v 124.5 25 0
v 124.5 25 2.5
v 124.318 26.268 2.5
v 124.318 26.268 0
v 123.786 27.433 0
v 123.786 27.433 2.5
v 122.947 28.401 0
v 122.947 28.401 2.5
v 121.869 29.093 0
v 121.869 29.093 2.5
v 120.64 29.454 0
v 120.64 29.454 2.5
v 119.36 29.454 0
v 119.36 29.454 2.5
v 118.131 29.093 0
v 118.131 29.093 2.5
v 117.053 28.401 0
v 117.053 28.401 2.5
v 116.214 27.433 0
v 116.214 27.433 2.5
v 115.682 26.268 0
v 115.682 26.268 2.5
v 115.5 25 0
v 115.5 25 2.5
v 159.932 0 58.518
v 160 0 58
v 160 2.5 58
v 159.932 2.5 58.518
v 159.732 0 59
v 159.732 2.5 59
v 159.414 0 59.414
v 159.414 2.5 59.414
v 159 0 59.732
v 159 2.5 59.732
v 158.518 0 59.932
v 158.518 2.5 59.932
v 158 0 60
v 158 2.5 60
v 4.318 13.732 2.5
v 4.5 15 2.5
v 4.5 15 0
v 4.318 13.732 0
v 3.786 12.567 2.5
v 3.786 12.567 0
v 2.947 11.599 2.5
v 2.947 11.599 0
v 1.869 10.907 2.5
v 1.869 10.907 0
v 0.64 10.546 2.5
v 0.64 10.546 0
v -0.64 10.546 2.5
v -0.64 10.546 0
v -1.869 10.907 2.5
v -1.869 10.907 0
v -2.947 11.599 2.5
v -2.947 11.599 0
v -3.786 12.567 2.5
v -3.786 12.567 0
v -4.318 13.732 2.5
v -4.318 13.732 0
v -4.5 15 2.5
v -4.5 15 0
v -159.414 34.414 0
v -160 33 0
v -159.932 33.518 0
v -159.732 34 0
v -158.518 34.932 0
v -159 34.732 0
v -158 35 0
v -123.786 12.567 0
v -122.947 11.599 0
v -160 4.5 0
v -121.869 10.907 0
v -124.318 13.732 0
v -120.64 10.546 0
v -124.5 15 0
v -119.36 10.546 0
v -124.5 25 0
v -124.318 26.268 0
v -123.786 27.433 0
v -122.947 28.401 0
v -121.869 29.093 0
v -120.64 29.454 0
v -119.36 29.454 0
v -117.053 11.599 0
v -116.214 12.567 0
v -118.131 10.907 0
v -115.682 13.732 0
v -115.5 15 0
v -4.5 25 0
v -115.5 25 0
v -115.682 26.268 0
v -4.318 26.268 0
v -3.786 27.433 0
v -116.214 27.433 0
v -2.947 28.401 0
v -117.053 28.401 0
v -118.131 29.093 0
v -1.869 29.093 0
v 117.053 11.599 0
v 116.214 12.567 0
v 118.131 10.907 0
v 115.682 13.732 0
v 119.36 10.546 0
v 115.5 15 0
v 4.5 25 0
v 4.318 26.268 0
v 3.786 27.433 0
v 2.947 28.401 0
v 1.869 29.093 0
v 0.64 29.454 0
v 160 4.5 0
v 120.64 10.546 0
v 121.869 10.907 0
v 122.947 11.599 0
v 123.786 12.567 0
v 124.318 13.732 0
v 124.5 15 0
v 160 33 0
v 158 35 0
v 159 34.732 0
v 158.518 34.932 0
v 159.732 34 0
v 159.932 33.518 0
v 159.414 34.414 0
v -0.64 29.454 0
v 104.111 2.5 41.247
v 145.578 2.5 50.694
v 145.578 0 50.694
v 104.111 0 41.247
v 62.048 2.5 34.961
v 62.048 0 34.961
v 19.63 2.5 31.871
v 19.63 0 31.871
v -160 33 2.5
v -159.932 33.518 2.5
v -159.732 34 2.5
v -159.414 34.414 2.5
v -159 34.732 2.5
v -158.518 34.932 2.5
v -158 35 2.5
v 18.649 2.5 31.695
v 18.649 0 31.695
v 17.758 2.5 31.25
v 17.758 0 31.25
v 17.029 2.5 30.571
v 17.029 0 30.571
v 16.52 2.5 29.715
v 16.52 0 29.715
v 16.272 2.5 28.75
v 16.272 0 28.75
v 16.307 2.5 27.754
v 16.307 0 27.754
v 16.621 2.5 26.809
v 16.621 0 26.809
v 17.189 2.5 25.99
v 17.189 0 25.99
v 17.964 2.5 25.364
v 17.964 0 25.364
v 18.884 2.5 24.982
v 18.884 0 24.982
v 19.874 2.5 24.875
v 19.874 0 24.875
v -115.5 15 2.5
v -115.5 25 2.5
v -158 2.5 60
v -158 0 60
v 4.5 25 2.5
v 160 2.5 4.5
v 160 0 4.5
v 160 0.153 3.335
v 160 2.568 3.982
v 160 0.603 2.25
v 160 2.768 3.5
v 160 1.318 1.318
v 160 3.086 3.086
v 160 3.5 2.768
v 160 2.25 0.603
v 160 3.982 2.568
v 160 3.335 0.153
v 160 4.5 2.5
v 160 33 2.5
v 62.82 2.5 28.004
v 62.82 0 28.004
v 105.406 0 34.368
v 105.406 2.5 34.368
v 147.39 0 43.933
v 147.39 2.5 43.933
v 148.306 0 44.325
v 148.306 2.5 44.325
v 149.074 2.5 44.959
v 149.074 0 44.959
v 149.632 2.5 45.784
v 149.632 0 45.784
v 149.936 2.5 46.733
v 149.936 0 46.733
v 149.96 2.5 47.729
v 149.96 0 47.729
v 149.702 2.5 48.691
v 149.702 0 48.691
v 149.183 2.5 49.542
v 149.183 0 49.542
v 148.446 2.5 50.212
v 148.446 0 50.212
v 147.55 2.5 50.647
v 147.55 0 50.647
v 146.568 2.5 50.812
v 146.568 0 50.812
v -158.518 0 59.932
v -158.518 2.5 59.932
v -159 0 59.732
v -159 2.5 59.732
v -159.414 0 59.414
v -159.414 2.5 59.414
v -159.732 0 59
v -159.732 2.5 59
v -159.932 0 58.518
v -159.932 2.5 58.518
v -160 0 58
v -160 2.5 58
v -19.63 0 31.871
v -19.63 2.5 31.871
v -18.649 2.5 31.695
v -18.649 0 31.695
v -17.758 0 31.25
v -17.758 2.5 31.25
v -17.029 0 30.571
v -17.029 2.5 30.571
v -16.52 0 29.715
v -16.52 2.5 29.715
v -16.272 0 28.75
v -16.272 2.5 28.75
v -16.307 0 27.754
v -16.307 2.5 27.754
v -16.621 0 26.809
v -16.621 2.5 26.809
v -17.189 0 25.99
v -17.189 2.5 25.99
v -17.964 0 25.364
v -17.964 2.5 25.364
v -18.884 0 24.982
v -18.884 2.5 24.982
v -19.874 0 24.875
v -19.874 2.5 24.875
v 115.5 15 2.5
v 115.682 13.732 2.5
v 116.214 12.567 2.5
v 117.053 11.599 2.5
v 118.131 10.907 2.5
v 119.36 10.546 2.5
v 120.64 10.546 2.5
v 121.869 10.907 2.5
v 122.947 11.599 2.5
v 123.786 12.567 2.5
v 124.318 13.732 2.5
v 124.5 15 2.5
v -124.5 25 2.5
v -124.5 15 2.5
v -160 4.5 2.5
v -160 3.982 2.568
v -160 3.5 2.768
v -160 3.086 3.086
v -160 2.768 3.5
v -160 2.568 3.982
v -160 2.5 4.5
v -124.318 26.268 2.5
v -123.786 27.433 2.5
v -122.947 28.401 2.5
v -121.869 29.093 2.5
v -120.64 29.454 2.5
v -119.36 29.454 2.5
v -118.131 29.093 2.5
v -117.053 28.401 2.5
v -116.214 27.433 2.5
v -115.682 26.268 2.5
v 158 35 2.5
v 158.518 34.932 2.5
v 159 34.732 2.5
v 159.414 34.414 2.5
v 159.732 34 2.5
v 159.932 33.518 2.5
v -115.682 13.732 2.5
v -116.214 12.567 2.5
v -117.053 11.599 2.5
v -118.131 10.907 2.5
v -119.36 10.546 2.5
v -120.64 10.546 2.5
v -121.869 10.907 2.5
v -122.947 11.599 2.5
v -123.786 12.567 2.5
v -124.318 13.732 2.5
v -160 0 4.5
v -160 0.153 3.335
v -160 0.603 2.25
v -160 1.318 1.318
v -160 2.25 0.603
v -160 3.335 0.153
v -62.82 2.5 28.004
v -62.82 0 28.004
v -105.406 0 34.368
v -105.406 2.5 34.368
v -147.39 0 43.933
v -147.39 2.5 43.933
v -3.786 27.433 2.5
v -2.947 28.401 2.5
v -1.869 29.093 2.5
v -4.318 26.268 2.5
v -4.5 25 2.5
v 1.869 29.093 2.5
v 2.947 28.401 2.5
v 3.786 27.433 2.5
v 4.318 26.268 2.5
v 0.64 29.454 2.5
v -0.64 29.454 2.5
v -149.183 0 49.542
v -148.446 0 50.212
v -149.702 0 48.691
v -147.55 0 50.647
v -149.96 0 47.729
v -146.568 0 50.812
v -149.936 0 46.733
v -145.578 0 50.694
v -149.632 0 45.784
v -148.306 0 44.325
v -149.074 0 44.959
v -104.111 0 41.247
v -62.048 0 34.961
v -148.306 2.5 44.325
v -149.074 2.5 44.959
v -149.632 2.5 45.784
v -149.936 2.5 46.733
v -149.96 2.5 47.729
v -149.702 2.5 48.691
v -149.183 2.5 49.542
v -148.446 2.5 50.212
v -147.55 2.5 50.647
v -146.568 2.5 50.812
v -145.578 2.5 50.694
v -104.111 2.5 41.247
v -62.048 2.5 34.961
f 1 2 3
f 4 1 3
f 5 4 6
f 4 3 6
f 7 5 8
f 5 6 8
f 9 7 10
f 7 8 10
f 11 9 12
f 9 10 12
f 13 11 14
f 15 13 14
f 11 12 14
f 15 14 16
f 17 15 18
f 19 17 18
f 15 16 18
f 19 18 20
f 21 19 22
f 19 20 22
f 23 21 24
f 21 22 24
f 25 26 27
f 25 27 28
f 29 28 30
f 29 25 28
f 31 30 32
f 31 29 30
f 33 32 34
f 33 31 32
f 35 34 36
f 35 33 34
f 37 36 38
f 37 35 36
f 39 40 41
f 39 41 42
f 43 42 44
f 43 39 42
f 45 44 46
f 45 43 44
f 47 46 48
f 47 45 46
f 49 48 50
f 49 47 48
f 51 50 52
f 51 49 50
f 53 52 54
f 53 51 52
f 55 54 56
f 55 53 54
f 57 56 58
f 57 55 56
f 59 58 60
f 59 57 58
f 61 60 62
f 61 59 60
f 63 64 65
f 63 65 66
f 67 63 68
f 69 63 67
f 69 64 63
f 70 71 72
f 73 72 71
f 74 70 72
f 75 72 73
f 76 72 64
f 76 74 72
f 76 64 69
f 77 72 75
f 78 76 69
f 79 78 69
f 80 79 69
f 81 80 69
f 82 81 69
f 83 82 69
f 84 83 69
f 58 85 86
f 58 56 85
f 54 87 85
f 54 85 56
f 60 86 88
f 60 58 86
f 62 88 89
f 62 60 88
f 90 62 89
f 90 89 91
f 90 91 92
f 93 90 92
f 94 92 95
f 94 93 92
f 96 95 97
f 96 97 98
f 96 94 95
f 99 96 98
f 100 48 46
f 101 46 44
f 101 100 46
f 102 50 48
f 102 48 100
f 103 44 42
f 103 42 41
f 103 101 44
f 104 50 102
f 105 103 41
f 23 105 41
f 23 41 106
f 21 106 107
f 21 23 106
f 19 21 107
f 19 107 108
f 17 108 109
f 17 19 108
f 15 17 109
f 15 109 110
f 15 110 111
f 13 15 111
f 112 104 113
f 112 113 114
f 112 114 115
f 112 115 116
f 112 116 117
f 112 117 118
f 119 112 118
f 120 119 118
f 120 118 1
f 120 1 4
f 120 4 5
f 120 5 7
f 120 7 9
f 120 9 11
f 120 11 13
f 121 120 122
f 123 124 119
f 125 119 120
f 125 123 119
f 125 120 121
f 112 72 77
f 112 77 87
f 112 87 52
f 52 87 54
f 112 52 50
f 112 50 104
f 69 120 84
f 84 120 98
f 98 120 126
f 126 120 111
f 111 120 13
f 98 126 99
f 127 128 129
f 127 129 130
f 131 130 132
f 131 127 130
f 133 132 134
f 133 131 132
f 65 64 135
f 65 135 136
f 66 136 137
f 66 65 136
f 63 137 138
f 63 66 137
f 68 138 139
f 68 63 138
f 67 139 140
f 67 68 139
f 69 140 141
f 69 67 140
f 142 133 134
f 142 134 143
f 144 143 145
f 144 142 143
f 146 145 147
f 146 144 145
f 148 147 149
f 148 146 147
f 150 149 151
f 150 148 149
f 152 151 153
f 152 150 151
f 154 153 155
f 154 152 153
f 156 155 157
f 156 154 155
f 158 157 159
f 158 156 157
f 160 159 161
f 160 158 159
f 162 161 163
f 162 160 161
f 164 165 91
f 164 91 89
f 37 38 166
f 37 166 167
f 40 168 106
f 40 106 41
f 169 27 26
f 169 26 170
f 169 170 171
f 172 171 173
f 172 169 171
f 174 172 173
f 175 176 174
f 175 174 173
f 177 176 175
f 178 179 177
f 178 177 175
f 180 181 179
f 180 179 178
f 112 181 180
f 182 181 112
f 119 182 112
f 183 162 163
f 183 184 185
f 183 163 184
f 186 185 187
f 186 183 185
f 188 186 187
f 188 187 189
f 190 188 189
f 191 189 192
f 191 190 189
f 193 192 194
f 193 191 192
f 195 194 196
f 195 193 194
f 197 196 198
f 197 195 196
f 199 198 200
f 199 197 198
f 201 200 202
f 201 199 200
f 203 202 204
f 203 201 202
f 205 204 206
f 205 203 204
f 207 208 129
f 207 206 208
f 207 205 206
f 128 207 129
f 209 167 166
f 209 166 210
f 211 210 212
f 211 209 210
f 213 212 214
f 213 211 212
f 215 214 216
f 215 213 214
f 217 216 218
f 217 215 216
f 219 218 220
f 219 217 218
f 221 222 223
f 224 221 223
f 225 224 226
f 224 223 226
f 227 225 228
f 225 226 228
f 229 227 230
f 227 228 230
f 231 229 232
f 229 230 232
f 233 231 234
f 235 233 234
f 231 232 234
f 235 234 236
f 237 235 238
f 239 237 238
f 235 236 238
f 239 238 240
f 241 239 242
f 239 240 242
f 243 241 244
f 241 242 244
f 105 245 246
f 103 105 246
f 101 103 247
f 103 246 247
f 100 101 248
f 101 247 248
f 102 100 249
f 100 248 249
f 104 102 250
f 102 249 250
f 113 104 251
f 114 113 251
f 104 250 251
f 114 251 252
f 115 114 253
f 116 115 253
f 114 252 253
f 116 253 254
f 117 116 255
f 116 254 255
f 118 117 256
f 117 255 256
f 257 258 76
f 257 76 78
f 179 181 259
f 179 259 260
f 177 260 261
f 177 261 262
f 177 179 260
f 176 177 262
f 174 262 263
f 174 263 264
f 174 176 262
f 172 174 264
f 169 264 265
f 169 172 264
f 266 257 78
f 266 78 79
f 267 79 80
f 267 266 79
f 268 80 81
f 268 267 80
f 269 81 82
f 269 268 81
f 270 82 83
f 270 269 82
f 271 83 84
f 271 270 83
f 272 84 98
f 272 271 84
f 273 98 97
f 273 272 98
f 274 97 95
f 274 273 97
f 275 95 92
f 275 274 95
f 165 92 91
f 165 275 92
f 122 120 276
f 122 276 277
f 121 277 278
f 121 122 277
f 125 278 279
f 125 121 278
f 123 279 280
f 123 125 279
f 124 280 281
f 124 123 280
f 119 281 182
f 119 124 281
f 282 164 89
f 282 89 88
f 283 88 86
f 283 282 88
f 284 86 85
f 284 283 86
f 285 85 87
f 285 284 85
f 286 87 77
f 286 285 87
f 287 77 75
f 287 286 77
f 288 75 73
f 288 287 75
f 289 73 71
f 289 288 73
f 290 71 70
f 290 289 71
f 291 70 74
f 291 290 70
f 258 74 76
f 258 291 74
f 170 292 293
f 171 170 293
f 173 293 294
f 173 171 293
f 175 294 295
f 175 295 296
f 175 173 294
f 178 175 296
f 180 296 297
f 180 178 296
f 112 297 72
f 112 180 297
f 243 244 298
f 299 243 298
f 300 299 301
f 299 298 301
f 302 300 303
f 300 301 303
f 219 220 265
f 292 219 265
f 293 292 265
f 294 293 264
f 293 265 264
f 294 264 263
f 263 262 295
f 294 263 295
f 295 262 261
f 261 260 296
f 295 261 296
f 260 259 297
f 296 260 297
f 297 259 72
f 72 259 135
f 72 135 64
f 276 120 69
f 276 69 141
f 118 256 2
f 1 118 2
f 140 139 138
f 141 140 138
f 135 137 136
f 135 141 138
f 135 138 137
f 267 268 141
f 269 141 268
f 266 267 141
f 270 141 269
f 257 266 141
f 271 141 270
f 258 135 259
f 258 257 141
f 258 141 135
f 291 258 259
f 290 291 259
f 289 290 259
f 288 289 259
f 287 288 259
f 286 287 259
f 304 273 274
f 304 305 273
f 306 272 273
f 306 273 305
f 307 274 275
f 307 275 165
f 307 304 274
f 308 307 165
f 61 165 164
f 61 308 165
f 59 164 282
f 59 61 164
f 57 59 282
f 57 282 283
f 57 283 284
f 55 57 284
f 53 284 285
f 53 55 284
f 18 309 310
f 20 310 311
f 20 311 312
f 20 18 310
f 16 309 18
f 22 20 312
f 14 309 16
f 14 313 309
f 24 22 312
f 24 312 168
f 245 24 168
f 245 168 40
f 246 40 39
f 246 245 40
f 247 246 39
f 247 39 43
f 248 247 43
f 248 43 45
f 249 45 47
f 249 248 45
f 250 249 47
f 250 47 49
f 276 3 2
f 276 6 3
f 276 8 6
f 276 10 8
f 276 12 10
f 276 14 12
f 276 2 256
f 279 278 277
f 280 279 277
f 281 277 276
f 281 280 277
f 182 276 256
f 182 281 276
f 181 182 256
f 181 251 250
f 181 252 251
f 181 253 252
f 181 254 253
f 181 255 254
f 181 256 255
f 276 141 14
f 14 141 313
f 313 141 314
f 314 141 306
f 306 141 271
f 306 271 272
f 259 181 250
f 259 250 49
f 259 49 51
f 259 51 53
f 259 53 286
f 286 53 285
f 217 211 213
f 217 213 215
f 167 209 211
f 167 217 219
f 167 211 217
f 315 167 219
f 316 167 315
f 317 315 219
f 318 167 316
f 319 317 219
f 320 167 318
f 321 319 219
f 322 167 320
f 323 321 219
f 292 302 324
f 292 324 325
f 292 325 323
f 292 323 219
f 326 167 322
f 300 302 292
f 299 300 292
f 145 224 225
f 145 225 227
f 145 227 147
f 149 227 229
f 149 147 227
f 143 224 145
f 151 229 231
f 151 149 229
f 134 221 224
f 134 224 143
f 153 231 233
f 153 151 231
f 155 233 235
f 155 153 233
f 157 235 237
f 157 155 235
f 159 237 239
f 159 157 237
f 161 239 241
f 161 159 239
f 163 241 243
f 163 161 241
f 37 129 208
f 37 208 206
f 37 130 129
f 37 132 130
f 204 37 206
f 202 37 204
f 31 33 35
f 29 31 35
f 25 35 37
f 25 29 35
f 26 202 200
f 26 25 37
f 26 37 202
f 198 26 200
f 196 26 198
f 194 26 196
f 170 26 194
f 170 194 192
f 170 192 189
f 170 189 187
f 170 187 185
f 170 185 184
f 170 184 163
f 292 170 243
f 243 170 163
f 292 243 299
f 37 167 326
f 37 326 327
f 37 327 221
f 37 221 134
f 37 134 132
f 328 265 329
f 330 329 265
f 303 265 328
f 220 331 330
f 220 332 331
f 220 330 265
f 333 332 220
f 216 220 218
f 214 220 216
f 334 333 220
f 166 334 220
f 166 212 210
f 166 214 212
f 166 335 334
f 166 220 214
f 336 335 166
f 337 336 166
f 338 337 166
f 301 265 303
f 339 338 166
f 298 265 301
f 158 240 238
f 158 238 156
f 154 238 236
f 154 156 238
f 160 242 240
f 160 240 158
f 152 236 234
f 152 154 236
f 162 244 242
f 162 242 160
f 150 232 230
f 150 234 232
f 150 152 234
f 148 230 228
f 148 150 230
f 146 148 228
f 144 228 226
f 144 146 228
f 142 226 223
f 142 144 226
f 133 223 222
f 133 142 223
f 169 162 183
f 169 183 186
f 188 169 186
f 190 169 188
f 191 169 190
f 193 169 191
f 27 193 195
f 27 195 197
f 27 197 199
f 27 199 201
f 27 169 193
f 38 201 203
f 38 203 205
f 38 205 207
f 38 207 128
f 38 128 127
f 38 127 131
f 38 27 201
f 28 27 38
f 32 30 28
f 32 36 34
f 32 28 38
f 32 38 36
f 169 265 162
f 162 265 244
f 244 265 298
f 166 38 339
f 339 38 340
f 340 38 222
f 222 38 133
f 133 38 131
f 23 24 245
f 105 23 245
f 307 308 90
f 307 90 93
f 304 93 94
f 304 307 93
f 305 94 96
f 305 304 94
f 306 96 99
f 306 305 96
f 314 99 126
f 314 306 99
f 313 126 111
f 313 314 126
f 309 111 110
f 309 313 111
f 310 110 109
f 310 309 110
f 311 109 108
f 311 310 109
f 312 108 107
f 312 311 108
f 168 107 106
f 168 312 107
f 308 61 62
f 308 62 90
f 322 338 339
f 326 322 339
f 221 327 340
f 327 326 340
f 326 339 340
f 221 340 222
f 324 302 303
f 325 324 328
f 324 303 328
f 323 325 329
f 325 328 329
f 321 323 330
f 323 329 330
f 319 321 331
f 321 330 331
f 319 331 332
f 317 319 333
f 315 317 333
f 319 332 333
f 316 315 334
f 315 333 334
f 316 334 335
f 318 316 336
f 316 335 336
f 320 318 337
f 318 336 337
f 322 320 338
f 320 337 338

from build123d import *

# Parameters (mm, degrees)
SM_BASE_FLANGE_1_DEPTH = 160
CUT_EXTRUDE_2_DEPTH    = 174.583553368
CUT_EXTRUDE_3_REACH    = 175.943
OTHER_1_DEPTH          = 2.5
OTHER_1_2_DEPTH        = 2.5


# Read off the part's stored shape, not the designer's step: 断开-边角1
# Sheet-metal steps are written as plain solids
with BuildPart() as part:
    # Sketch 1 → 基体-法兰1 (new, symmetric)
    with BuildSketch(Plane(origin=(0, 0, 0), x_dir=(0, 0, -1), z_dir=(1, 0, 0))):
        with BuildLine():
            Line((-60, 0), (-4.5, 0))
            ThreePointArc((-4.5, 0), (-1.318019485, 1.318019485), (0, 4.5))
            Line((0, 4.5), (0, 35))
            Line((0, 35), (-2.5, 35))
            Line((-2.5, 35), (-2.5, 4.5))
            ThreePointArc((-2.5, 4.5), (-3.085786438, 3.085786438), (-4.5, 2.5))
            Line((-4.5, 2.5), (-60, 2.5))
            Line((-60, 2.5), (-60, 0))
        make_face()
    extrude(amount=SM_BASE_FLANGE_1_DEPTH, both=True)

    # 草图5 → 切除-拉伸2 (cut, through all)
    with BuildSketch(Plane.XY.offset(2.5)):
        with BuildLine():
            Line((-115.5, 25), (-115.5, 15))
            ThreePointArc((-115.5, 15), (-120, 10.5), (-124.5, 15))
            Line((-124.5, 15), (-124.5, 25))
            ThreePointArc((-124.5, 25), (-120, 29.5), (-115.5, 25))
        make_face()
        with BuildLine():
            Line((115.5, 25), (115.5, 15))
            ThreePointArc((115.5, 15), (120, 10.5), (124.5, 15))
            Line((124.5, 15), (124.5, 25))
            ThreePointArc((124.5, 25), (120, 29.5), (115.5, 25))
        make_face()
        with BuildLine():
            Line((4.5, 25), (4.5, 15))
            ThreePointArc((4.5, 15), (0, 10.5), (-4.5, 15))
            Line((-4.5, 15), (-4.5, 25))
            ThreePointArc((-4.5, 25), (0, 29.5), (4.5, 25))
        make_face()
    extrude(amount=-CUT_EXTRUDE_2_DEPTH, mode=Mode.SUBTRACT)

    # 草图6 → 切除-拉伸3 (cut, up to next)
    with BuildSketch(Plane(origin=(0, 2.5, 0), x_dir=(1, 0, 0), z_dir=(0, 1, 0)), mode=Mode.PRIVATE) as cut_extrude_3_sk1:
        with BuildLine():
            ThreePointArc((-19.874276789, -24.875176049), (-84.173281176, -30.783424559), (-147.390129564, -43.932547934))
            ThreePointArc((-147.390129564, -43.932547934), (-149.865003298, -48.219154984), (-145.578396248, -50.694028718))
            ThreePointArc((-145.578396248, -50.694028718), (-83.138615298, -37.706535603), (-19.629980312, -31.870911838))
            ThreePointArc((-19.629980312, -31.870911838), (-16.254260656, -28.250895705), (-19.874276789, -24.875176049))
        make_face()
    cut_extrude_3_tool1 = extrude(cut_extrude_3_sk1.sketch, amount=-CUT_EXTRUDE_3_REACH, mode=Mode.PRIVATE) & part.part
    # 草图6 → 切除-拉伸3 (cut, up to next)
    with BuildSketch(Plane(origin=(0, 2.5, 0), x_dir=(1, 0, 0), z_dir=(0, 1, 0)), mode=Mode.PRIVATE) as cut_extrude_3_sk2:
        with BuildLine():
            ThreePointArc((19.874276789, -24.875176049), (84.173281176, -30.783424559), (147.390129564, -43.932547934))
            ThreePointArc((147.390129564, -43.932547934), (149.865003298, -48.219154984), (145.578396248, -50.694028718))
            ThreePointArc((145.578396248, -50.694028718), (83.138615298, -37.706535603), (19.629980312, -31.870911838))
            ThreePointArc((19.629980312, -31.870911838), (16.254260656, -28.250895705), (19.874276789, -24.875176049))
        make_face()
    cut_extrude_3_tool2 = extrude(cut_extrude_3_sk2.sketch, amount=-CUT_EXTRUDE_3_REACH, mode=Mode.PRIVATE) & part.part
    add(cut_extrude_3_tool1.solids().sort_by_distance((-83.461905, 2.5, 35.543351))[0], mode=Mode.SUBTRACT)
    add(cut_extrude_3_tool2.solids().sort_by_distance((83.461905, 2.5, 35.543351))[0], mode=Mode.SUBTRACT)

    # Other 1 outline → Other 1 (cut)
    with BuildSketch(Plane(origin=(0, 0, 0), x_dir=(1, 0, 0), z_dir=(0, 1, 0))):
        with BuildLine():
            Line((-160, -60), (-158, -60))
            ThreePointArc((-158, -60), (-159.414213562, -59.414213562), (-160, -58))
            Line((-160, -58), (-160, -60))
        make_face()
        with BuildLine():
            ThreePointArc((160, -58), (159.414213562, -59.414213562), (158, -60))
            Line((158, -60), (160, -60))
            Line((160, -60), (160, -58))
        make_face()
    extrude(amount=OTHER_1_DEPTH, mode=Mode.SUBTRACT)

    # Other 1 2 outline → Other 1 2 (cut)
    with BuildSketch(Plane.XY):
        with BuildLine():
            Line((160, 35), (158, 35))
            ThreePointArc((158, 35), (159.414213562, 34.414213562), (160, 33))
            Line((160, 33), (160, 35))
        make_face()
        with BuildLine():
            ThreePointArc((-160, 33), (-159.414213562, 34.414213562), (-158, 35))
            Line((-158, 35), (-160, 35))
            Line((-160, 35), (-160, 33))
        make_face()
    extrude(amount=OTHER_1_2_DEPTH, mode=Mode.SUBTRACT)


solid = part.part
